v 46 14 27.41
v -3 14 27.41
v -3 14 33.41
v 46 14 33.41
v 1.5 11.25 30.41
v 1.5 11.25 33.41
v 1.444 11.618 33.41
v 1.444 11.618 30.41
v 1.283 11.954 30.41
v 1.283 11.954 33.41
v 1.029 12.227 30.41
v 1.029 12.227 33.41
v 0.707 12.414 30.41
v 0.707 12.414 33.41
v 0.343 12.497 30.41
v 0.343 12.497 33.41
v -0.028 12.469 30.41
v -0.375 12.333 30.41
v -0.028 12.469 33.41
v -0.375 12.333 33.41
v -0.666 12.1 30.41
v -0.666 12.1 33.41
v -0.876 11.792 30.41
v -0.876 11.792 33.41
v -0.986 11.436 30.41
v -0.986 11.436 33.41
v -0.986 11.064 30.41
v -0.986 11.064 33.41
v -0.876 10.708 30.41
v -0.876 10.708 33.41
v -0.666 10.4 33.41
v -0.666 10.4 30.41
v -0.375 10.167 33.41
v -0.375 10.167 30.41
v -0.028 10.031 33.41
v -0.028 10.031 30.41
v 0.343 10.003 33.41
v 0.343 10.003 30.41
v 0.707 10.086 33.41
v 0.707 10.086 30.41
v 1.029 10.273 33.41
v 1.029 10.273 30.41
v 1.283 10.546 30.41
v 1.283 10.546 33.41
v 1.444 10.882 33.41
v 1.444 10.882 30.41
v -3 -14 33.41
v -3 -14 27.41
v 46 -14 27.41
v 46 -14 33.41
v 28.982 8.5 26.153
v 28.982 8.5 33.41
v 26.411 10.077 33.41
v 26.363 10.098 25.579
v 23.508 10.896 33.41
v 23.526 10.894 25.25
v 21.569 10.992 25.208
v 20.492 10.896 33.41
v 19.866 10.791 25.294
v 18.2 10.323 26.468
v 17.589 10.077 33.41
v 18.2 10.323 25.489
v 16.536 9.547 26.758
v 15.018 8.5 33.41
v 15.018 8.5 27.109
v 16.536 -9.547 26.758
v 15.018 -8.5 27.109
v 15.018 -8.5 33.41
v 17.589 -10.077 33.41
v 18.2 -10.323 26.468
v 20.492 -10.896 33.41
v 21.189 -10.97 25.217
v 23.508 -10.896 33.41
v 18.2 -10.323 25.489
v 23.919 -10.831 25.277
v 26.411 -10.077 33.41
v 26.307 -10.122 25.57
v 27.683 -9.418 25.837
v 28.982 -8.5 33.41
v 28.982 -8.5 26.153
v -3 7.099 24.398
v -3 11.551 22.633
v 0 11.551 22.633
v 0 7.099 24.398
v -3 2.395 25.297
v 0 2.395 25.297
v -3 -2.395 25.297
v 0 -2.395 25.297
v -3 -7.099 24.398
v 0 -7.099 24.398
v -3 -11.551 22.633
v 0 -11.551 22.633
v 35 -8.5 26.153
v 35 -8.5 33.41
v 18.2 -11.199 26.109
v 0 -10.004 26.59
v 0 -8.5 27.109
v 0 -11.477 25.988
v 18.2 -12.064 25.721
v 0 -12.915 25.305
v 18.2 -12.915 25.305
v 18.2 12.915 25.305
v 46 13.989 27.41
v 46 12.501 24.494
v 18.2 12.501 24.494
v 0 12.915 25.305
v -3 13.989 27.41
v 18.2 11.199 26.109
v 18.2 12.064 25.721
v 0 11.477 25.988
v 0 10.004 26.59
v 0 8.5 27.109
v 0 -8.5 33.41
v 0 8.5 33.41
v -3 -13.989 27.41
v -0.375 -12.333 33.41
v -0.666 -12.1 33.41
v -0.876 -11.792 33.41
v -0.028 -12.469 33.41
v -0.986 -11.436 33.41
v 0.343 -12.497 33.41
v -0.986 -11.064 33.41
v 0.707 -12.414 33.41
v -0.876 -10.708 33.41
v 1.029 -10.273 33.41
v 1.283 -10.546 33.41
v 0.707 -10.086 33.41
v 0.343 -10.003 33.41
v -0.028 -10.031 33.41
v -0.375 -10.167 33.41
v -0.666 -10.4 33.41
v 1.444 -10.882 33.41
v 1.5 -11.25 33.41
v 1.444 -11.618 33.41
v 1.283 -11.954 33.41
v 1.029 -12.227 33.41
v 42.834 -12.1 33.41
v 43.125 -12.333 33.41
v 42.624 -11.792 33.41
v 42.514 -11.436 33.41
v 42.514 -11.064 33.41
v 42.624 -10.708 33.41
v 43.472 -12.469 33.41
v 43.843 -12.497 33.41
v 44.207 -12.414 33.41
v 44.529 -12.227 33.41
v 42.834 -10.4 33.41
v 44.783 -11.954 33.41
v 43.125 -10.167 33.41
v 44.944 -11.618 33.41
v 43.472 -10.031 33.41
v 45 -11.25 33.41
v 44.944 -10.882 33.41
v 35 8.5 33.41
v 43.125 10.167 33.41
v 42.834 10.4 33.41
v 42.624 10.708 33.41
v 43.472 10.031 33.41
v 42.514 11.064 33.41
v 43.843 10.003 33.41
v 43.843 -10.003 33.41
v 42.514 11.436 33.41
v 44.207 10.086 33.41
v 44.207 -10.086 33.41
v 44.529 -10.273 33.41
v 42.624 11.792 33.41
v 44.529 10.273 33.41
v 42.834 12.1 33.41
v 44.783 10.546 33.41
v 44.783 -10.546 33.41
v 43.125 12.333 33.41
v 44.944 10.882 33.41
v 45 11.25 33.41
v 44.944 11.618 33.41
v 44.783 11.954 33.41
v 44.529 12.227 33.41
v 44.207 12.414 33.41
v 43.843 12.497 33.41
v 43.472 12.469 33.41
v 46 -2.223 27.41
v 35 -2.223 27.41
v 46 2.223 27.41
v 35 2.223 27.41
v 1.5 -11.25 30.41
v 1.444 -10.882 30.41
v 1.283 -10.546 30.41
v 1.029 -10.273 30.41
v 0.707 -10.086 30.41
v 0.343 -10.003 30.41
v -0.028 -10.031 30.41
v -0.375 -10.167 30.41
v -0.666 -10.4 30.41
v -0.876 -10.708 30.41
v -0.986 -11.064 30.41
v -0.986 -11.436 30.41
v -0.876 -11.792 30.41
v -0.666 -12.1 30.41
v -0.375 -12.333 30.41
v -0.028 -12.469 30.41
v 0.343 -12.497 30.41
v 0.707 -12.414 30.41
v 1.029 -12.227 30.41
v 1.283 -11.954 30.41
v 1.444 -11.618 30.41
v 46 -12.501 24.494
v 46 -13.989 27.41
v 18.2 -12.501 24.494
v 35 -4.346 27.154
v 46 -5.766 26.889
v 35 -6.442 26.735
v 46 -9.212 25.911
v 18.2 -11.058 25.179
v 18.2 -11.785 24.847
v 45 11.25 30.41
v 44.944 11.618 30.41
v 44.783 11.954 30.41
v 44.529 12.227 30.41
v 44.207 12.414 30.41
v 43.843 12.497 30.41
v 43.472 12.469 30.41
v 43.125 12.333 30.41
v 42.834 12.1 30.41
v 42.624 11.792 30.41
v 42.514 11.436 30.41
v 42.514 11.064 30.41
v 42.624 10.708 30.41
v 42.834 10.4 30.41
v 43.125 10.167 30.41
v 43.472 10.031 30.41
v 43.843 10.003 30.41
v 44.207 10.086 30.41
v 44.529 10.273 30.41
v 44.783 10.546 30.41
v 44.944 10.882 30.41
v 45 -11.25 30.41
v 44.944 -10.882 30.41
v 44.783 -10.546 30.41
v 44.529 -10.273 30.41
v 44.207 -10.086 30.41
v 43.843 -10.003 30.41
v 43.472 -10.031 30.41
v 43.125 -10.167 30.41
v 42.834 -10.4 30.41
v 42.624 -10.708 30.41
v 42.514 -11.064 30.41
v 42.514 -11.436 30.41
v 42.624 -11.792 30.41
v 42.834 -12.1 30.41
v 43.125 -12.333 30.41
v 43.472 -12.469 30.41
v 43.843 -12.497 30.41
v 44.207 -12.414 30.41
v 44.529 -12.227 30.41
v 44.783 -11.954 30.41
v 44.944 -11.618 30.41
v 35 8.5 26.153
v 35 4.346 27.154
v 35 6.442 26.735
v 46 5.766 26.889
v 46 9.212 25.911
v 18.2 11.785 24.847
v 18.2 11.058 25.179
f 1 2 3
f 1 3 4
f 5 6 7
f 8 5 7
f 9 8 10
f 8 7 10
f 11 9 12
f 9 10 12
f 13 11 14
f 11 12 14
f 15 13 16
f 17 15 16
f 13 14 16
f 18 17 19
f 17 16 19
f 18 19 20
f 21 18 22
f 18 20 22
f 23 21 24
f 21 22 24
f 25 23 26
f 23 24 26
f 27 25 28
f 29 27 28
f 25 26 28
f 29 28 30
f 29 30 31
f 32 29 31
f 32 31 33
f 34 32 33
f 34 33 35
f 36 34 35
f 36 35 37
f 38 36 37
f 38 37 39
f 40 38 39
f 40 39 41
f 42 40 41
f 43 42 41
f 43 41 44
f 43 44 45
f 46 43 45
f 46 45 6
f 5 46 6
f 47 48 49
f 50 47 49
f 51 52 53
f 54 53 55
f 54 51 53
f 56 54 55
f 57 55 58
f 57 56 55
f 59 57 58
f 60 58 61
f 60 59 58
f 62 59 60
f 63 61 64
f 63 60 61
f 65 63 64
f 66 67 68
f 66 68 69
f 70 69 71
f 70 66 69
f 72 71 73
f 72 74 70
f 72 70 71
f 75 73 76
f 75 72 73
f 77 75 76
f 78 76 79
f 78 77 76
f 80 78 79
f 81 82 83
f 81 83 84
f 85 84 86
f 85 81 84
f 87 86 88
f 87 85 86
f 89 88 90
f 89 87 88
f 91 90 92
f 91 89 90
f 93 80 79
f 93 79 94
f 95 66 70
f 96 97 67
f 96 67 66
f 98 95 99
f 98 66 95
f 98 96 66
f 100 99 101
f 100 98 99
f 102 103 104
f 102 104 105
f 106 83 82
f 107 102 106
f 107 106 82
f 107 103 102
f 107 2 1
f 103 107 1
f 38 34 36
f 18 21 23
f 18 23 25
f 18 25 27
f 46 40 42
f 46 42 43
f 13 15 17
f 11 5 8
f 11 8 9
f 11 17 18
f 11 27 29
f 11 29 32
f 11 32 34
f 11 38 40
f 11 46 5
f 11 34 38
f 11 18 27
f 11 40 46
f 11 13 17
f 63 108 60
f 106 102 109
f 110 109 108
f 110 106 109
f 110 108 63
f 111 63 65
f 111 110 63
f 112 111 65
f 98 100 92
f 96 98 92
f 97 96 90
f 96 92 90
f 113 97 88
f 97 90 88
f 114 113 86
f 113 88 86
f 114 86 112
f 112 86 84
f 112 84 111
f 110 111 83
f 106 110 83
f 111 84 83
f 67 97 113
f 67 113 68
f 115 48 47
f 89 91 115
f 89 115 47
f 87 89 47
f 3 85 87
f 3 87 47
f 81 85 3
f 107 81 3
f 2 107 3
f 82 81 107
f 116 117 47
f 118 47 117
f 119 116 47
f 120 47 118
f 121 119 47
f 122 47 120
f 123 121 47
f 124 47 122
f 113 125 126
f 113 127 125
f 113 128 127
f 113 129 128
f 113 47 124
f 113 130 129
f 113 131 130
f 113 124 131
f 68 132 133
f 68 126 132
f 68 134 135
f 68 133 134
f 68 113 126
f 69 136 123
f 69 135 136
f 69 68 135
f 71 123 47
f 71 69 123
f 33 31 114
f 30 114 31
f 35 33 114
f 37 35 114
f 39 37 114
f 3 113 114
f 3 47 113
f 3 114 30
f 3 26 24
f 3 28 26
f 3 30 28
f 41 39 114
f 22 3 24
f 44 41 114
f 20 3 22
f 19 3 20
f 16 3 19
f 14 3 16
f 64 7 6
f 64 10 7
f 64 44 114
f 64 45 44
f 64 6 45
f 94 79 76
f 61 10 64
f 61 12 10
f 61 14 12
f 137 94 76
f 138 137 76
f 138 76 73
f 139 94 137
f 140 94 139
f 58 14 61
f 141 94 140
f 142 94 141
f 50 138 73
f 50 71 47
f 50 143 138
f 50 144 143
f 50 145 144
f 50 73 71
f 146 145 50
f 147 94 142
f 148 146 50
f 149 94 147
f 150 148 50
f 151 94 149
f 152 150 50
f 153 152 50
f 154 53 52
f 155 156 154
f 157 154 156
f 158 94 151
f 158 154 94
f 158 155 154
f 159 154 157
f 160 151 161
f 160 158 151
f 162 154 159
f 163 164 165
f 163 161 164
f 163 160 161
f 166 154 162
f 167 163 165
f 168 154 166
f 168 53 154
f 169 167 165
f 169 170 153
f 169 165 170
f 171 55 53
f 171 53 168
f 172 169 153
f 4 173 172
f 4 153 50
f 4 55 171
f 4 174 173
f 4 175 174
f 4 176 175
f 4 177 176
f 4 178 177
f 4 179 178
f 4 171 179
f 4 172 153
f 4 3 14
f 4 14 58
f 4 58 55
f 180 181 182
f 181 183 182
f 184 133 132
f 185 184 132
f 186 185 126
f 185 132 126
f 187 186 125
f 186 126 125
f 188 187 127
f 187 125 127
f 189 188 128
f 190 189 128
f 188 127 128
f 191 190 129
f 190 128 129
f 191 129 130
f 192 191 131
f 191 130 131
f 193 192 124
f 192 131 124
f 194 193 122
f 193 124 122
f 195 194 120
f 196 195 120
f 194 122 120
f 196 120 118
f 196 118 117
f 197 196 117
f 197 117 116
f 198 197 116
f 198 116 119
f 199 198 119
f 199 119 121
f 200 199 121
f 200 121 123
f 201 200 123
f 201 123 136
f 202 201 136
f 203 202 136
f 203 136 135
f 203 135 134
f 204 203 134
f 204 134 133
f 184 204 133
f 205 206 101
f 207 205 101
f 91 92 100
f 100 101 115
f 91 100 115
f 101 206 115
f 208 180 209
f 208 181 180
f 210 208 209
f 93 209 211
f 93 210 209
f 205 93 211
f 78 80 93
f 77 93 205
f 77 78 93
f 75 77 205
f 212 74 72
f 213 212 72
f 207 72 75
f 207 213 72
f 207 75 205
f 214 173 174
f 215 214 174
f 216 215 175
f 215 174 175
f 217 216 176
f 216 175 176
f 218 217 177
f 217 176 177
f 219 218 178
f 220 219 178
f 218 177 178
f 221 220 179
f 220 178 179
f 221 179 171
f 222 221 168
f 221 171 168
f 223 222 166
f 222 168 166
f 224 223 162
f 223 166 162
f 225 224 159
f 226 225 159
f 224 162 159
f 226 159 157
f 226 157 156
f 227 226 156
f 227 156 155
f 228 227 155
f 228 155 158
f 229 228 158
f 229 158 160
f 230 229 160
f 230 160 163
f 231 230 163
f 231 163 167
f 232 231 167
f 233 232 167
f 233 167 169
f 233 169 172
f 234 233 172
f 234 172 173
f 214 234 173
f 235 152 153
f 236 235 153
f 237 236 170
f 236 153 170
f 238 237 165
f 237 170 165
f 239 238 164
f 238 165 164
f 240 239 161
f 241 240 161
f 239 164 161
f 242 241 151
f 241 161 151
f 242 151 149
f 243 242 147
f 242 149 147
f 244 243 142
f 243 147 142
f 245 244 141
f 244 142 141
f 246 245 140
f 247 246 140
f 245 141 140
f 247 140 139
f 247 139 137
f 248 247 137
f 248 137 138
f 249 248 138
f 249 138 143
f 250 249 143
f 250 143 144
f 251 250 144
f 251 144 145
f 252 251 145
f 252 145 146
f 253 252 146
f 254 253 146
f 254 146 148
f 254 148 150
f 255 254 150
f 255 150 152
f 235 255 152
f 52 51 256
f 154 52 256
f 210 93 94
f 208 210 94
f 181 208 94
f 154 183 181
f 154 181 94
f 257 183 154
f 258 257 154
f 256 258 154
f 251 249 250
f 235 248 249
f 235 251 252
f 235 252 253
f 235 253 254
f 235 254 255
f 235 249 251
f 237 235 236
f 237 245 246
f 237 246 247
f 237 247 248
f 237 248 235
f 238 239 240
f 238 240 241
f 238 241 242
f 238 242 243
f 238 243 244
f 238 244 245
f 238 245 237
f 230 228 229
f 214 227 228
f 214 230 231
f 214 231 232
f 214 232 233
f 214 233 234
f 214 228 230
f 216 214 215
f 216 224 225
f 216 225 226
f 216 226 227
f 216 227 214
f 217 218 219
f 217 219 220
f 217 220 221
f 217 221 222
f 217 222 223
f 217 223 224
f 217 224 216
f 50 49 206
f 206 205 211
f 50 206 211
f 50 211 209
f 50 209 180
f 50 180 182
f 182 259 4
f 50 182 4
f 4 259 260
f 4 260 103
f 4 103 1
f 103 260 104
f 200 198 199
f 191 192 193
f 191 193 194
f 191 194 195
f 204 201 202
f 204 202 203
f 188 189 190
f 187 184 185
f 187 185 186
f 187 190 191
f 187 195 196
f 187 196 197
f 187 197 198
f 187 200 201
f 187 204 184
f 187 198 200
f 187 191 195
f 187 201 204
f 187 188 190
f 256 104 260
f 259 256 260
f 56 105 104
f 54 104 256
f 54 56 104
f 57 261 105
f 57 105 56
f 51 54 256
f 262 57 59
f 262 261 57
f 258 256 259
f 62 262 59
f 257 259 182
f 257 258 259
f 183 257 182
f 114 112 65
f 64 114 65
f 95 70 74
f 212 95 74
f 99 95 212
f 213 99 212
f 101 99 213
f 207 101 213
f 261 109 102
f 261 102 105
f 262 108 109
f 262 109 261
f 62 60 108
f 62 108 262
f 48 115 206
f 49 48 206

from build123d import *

# Parameters (mm, degrees)
REVOLUTION_ANGLE     = -54.075512
SKETCH002_W          = 49
SKETCH002_H          = 28
PAD_DEPTH            = 6
SKETCH003_W          = 35
SKETCH003_H          = 17
POCKET001_DEPTH      = 0.001
POCKET001_DEPTH_BACK = 33.411
SKETCH004_R          = 1.25
POCKET_DEPTH         = 3.1
SKETCH001_W          = 59
SKETCH001_H          = 38
SKETCH001_W_2        = 49
SKETCH001_H_2        = 28
POCKET005_DEPTH      = 5.778131
SKETCH009_R          = 11
POCKET006_DEPTH      = 33.411


with BuildPart() as part:
    # Sketch → Revolution (revolve, symmetric)
    with BuildSketch(Plane.XZ) as revolution_sk:
        Polygon((-3, 31.41), (46, 31.41), (46, 27.5), (18.2, 27.5), (18.2, 28.41), (0, 28.41), (0, 25.41), (-3, 25.41), align=None)
    revolve(axis=Axis((0, 0, 0), (1, 0, 0)), revolution_arc=REVOLUTION_ANGLE / 2)
    revolve(revolution_sk.sketch, axis=Axis((0, 0, 0), (-1, 0, 0)), revolution_arc=REVOLUTION_ANGLE / 2)

    # Sketch002 → Pad (new body)
    with BuildSketch(Plane.XY.offset(27.41)):
        with Locations((21.5, 0)):
            Rectangle(SKETCH002_W, SKETCH002_H)
    extrude(amount=PAD_DEPTH)

    # Sketch003 → Pocket001 (cut, two sides)
    with BuildSketch(Plane.XY) as pocket001_sk:
        with Locations((17.5, 0)):
            Rectangle(SKETCH003_W, SKETCH003_H)
    extrude(amount=-POCKET001_DEPTH, mode=Mode.SUBTRACT)
    extrude(pocket001_sk.sketch, amount=POCKET001_DEPTH_BACK, mode=Mode.SUBTRACT)

    # Sketch004 → Pocket (cut)
    with BuildSketch(Plane.XY.offset(33.51)):
        with Locations((43.75, 11.25)):
            Circle(SKETCH004_R)
        with Locations((0.25, 11.25)):
            Circle(SKETCH004_R)
        with Locations((0.25, -11.25)):
            Circle(SKETCH004_R)
        with Locations((43.75, -11.25)):
            Circle(SKETCH004_R)
    extrude(amount=-POCKET_DEPTH, mode=Mode.SUBTRACT)

    # Sketch001 → Pocket005 (cut, through all)
    with BuildSketch(Plane.XY.offset(28.41)):
        with Locations((21.5, 0)):
            Rectangle(SKETCH001_W, SKETCH001_H)
        with Locations((21.5, 0)):
            Rectangle(SKETCH001_W_2, SKETCH001_H_2, mode=Mode.SUBTRACT)
    extrude(amount=-POCKET005_DEPTH, mode=Mode.SUBTRACT)

    # Sketch009 → Pocket006 (cut, through all)
    with BuildSketch(Plane.XY):
        with Locations((22, 0)):
            Circle(SKETCH009_R)
    extrude(amount=POCKET006_DEPTH, mode=Mode.SUBTRACT)


solid = part.part
